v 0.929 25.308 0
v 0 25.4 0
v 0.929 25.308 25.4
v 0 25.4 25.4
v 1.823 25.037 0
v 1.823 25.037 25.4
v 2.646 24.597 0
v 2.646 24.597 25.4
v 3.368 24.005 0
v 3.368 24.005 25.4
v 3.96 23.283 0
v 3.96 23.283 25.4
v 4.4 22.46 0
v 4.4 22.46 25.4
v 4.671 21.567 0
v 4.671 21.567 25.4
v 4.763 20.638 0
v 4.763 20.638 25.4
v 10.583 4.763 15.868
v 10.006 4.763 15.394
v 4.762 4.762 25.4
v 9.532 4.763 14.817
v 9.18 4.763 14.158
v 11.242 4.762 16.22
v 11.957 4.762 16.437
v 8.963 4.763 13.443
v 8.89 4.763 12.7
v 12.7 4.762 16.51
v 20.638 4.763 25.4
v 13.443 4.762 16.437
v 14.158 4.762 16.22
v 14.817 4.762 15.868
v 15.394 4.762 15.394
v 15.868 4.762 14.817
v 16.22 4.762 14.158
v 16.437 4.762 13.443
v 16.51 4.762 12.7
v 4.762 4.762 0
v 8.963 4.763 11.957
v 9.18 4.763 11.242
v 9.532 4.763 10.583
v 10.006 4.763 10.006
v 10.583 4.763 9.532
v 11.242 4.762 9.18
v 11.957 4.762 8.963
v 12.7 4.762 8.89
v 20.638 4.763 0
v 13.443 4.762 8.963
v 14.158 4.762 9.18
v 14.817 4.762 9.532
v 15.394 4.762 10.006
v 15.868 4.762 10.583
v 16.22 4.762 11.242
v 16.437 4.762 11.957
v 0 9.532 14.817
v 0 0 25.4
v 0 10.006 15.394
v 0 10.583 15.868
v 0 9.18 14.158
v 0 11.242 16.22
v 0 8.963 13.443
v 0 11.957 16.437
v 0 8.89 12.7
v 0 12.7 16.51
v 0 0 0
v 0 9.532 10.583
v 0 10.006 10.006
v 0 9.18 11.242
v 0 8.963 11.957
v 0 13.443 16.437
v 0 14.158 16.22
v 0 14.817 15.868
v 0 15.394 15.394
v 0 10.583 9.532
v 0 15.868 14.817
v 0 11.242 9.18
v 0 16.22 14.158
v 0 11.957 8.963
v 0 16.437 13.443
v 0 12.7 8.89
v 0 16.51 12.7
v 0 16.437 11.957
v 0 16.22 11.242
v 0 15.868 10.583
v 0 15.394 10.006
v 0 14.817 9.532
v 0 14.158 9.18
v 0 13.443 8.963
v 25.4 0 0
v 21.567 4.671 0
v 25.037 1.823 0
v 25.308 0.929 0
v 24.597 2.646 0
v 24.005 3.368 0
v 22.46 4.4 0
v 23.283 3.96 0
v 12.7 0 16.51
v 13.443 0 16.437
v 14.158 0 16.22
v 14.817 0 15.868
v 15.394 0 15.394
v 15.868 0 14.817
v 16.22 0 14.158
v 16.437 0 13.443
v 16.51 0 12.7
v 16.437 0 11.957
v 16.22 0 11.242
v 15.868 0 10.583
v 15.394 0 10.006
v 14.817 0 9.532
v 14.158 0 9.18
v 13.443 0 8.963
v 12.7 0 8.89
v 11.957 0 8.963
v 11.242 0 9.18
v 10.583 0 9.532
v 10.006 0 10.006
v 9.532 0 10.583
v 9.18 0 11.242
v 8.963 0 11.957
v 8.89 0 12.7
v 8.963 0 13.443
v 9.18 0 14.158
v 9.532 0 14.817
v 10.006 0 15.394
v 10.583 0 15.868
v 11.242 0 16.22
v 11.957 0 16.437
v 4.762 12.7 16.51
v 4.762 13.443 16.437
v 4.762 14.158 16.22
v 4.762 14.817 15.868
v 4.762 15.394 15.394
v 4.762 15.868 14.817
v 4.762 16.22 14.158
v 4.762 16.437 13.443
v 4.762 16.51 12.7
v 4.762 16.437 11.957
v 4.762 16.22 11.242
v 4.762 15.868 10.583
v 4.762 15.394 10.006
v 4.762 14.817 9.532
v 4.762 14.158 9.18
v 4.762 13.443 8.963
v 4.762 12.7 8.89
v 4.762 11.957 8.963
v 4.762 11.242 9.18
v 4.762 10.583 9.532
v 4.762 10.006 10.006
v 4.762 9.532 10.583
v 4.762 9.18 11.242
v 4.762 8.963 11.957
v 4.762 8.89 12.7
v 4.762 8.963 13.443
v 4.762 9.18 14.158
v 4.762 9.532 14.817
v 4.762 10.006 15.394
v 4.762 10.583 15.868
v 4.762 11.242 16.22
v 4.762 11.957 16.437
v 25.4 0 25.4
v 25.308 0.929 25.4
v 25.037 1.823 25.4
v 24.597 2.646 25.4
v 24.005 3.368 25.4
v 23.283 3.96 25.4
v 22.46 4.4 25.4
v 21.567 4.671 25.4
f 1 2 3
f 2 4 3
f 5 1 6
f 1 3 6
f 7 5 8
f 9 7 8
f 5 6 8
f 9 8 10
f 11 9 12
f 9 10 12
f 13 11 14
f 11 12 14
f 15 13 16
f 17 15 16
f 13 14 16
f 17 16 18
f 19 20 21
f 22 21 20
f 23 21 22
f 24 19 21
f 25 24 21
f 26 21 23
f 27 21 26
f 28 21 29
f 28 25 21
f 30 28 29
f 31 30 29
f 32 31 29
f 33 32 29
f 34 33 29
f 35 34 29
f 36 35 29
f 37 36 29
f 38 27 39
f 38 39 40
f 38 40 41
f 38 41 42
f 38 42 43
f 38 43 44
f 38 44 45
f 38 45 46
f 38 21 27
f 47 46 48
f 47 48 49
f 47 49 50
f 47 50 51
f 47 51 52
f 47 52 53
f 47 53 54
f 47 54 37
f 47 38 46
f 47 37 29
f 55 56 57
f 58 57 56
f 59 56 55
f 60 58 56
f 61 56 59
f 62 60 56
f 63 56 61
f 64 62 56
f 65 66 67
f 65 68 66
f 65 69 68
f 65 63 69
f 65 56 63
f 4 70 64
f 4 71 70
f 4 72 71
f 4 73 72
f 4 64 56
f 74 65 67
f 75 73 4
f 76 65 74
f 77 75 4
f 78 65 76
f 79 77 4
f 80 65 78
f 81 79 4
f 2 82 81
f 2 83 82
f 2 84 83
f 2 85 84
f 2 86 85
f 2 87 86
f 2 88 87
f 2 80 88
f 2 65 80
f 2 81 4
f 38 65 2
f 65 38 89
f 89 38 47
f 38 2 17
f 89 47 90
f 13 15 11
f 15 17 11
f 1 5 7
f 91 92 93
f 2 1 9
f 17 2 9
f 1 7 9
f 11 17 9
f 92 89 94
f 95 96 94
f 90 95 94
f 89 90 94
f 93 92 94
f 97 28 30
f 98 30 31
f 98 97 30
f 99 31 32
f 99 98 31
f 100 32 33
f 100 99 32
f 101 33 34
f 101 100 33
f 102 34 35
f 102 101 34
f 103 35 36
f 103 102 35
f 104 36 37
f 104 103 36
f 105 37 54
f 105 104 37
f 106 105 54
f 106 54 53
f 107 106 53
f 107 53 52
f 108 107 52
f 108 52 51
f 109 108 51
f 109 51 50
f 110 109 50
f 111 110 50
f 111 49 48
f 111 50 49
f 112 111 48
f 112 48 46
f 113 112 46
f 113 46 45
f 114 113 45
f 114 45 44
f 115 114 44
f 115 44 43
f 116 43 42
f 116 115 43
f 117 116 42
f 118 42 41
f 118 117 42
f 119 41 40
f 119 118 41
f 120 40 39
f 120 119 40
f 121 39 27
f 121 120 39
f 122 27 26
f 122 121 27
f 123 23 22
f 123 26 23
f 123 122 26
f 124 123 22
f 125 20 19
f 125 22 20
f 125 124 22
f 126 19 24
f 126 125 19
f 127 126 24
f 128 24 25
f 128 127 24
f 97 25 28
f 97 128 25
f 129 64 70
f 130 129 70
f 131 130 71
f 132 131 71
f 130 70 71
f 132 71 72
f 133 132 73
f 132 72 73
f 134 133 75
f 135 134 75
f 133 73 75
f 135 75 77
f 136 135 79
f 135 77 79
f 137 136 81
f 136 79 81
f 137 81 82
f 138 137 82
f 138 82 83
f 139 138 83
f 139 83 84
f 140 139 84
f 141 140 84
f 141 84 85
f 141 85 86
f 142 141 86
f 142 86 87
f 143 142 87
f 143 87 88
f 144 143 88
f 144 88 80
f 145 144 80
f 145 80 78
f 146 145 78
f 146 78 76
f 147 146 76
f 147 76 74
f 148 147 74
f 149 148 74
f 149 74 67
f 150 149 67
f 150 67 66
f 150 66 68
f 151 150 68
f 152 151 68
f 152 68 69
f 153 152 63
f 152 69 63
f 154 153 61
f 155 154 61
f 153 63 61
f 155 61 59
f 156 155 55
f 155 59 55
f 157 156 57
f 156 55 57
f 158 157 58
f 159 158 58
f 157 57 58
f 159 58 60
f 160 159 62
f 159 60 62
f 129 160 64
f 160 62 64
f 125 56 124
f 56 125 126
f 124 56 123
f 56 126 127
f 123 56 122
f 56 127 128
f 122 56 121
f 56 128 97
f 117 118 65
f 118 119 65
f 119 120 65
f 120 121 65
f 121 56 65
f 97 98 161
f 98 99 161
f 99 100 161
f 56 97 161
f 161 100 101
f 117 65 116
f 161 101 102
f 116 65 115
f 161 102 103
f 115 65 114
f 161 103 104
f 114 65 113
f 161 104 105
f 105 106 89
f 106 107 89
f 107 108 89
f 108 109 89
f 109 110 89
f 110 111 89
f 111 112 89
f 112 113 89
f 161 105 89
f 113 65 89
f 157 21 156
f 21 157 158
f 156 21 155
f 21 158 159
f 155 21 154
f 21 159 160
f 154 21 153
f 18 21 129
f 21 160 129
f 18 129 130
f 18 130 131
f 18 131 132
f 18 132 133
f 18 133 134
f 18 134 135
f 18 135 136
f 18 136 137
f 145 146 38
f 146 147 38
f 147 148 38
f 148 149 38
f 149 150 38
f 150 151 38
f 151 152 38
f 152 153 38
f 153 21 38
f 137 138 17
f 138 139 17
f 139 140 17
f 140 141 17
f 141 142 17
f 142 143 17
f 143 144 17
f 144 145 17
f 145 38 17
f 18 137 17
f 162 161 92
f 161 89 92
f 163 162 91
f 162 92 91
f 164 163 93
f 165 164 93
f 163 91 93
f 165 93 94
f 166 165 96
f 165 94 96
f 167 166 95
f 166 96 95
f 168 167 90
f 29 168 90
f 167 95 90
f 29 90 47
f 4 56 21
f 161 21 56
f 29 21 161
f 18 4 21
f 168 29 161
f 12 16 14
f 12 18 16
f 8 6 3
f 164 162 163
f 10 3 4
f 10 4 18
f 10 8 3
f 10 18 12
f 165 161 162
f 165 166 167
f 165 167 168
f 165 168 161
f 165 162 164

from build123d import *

# Parameters (mm, degrees)
SKETCH2_W           = 25.4
SKETCH2_H           = 25.4
BOSS_EXTRUDE1_DEPTH = 25.4
SHELL1_T            = -4.7625
FILLET1_R           = 4.7625
SKETCH3_R           = 3.81
CUT_EXTRUDE1_DEPTH  = 25.4


with BuildPart() as part:
    # Sketch2 → Boss-Extrude1 (new body)
    with BuildSketch(Plane.XY):
        with Locations((12.7, 12.7)):
            Rectangle(SKETCH2_W, SKETCH2_H)
    extrude(amount=BOSS_EXTRUDE1_DEPTH)

    # Shell1
    shell1_openings = [part.faces().sort_by_distance(p)[0] for p in [
        (12.7, 12.7, 25.4),
        (12.7, 12.7, 0),
        (12.7, 25.4, 12.7),
        (25.4, 12.7, 12.7),
    ]]
    offset(amount=SHELL1_T, openings=shell1_openings, kind=Kind.INTERSECTION)

    # Fillet1
    fillet1_edges = [part.edges().sort_by_distance(p)[0] for p in [
        (25.4, 4.7625, 12.7),
        (4.7625, 25.4, 12.7),
    ]]
    fillet(fillet1_edges, radius=FILLET1_R - 0.0001)  # a hair under: the kernel refuses the full size

    # Sketch3 → Cut-Extrude1 (cut)
    with BuildSketch(Plane.ZY):
        with Locations((12.7, 12.7)):
            Circle(SKETCH3_R)
    cut_extrude1 = extrude(amount=-CUT_EXTRUDE1_DEPTH, mode=Mode.SUBTRACT)

    # Mirror1: Cut-Extrude1 across plane
    add(cut_extrude1.mirror(Plane(origin=(0, 0, 0), x_dir=(0, 0, 1), z_dir=(-0.7071067811865475, 0.7071067811865477, 0))), mode=Mode.SUBTRACT)


solid = part.part
